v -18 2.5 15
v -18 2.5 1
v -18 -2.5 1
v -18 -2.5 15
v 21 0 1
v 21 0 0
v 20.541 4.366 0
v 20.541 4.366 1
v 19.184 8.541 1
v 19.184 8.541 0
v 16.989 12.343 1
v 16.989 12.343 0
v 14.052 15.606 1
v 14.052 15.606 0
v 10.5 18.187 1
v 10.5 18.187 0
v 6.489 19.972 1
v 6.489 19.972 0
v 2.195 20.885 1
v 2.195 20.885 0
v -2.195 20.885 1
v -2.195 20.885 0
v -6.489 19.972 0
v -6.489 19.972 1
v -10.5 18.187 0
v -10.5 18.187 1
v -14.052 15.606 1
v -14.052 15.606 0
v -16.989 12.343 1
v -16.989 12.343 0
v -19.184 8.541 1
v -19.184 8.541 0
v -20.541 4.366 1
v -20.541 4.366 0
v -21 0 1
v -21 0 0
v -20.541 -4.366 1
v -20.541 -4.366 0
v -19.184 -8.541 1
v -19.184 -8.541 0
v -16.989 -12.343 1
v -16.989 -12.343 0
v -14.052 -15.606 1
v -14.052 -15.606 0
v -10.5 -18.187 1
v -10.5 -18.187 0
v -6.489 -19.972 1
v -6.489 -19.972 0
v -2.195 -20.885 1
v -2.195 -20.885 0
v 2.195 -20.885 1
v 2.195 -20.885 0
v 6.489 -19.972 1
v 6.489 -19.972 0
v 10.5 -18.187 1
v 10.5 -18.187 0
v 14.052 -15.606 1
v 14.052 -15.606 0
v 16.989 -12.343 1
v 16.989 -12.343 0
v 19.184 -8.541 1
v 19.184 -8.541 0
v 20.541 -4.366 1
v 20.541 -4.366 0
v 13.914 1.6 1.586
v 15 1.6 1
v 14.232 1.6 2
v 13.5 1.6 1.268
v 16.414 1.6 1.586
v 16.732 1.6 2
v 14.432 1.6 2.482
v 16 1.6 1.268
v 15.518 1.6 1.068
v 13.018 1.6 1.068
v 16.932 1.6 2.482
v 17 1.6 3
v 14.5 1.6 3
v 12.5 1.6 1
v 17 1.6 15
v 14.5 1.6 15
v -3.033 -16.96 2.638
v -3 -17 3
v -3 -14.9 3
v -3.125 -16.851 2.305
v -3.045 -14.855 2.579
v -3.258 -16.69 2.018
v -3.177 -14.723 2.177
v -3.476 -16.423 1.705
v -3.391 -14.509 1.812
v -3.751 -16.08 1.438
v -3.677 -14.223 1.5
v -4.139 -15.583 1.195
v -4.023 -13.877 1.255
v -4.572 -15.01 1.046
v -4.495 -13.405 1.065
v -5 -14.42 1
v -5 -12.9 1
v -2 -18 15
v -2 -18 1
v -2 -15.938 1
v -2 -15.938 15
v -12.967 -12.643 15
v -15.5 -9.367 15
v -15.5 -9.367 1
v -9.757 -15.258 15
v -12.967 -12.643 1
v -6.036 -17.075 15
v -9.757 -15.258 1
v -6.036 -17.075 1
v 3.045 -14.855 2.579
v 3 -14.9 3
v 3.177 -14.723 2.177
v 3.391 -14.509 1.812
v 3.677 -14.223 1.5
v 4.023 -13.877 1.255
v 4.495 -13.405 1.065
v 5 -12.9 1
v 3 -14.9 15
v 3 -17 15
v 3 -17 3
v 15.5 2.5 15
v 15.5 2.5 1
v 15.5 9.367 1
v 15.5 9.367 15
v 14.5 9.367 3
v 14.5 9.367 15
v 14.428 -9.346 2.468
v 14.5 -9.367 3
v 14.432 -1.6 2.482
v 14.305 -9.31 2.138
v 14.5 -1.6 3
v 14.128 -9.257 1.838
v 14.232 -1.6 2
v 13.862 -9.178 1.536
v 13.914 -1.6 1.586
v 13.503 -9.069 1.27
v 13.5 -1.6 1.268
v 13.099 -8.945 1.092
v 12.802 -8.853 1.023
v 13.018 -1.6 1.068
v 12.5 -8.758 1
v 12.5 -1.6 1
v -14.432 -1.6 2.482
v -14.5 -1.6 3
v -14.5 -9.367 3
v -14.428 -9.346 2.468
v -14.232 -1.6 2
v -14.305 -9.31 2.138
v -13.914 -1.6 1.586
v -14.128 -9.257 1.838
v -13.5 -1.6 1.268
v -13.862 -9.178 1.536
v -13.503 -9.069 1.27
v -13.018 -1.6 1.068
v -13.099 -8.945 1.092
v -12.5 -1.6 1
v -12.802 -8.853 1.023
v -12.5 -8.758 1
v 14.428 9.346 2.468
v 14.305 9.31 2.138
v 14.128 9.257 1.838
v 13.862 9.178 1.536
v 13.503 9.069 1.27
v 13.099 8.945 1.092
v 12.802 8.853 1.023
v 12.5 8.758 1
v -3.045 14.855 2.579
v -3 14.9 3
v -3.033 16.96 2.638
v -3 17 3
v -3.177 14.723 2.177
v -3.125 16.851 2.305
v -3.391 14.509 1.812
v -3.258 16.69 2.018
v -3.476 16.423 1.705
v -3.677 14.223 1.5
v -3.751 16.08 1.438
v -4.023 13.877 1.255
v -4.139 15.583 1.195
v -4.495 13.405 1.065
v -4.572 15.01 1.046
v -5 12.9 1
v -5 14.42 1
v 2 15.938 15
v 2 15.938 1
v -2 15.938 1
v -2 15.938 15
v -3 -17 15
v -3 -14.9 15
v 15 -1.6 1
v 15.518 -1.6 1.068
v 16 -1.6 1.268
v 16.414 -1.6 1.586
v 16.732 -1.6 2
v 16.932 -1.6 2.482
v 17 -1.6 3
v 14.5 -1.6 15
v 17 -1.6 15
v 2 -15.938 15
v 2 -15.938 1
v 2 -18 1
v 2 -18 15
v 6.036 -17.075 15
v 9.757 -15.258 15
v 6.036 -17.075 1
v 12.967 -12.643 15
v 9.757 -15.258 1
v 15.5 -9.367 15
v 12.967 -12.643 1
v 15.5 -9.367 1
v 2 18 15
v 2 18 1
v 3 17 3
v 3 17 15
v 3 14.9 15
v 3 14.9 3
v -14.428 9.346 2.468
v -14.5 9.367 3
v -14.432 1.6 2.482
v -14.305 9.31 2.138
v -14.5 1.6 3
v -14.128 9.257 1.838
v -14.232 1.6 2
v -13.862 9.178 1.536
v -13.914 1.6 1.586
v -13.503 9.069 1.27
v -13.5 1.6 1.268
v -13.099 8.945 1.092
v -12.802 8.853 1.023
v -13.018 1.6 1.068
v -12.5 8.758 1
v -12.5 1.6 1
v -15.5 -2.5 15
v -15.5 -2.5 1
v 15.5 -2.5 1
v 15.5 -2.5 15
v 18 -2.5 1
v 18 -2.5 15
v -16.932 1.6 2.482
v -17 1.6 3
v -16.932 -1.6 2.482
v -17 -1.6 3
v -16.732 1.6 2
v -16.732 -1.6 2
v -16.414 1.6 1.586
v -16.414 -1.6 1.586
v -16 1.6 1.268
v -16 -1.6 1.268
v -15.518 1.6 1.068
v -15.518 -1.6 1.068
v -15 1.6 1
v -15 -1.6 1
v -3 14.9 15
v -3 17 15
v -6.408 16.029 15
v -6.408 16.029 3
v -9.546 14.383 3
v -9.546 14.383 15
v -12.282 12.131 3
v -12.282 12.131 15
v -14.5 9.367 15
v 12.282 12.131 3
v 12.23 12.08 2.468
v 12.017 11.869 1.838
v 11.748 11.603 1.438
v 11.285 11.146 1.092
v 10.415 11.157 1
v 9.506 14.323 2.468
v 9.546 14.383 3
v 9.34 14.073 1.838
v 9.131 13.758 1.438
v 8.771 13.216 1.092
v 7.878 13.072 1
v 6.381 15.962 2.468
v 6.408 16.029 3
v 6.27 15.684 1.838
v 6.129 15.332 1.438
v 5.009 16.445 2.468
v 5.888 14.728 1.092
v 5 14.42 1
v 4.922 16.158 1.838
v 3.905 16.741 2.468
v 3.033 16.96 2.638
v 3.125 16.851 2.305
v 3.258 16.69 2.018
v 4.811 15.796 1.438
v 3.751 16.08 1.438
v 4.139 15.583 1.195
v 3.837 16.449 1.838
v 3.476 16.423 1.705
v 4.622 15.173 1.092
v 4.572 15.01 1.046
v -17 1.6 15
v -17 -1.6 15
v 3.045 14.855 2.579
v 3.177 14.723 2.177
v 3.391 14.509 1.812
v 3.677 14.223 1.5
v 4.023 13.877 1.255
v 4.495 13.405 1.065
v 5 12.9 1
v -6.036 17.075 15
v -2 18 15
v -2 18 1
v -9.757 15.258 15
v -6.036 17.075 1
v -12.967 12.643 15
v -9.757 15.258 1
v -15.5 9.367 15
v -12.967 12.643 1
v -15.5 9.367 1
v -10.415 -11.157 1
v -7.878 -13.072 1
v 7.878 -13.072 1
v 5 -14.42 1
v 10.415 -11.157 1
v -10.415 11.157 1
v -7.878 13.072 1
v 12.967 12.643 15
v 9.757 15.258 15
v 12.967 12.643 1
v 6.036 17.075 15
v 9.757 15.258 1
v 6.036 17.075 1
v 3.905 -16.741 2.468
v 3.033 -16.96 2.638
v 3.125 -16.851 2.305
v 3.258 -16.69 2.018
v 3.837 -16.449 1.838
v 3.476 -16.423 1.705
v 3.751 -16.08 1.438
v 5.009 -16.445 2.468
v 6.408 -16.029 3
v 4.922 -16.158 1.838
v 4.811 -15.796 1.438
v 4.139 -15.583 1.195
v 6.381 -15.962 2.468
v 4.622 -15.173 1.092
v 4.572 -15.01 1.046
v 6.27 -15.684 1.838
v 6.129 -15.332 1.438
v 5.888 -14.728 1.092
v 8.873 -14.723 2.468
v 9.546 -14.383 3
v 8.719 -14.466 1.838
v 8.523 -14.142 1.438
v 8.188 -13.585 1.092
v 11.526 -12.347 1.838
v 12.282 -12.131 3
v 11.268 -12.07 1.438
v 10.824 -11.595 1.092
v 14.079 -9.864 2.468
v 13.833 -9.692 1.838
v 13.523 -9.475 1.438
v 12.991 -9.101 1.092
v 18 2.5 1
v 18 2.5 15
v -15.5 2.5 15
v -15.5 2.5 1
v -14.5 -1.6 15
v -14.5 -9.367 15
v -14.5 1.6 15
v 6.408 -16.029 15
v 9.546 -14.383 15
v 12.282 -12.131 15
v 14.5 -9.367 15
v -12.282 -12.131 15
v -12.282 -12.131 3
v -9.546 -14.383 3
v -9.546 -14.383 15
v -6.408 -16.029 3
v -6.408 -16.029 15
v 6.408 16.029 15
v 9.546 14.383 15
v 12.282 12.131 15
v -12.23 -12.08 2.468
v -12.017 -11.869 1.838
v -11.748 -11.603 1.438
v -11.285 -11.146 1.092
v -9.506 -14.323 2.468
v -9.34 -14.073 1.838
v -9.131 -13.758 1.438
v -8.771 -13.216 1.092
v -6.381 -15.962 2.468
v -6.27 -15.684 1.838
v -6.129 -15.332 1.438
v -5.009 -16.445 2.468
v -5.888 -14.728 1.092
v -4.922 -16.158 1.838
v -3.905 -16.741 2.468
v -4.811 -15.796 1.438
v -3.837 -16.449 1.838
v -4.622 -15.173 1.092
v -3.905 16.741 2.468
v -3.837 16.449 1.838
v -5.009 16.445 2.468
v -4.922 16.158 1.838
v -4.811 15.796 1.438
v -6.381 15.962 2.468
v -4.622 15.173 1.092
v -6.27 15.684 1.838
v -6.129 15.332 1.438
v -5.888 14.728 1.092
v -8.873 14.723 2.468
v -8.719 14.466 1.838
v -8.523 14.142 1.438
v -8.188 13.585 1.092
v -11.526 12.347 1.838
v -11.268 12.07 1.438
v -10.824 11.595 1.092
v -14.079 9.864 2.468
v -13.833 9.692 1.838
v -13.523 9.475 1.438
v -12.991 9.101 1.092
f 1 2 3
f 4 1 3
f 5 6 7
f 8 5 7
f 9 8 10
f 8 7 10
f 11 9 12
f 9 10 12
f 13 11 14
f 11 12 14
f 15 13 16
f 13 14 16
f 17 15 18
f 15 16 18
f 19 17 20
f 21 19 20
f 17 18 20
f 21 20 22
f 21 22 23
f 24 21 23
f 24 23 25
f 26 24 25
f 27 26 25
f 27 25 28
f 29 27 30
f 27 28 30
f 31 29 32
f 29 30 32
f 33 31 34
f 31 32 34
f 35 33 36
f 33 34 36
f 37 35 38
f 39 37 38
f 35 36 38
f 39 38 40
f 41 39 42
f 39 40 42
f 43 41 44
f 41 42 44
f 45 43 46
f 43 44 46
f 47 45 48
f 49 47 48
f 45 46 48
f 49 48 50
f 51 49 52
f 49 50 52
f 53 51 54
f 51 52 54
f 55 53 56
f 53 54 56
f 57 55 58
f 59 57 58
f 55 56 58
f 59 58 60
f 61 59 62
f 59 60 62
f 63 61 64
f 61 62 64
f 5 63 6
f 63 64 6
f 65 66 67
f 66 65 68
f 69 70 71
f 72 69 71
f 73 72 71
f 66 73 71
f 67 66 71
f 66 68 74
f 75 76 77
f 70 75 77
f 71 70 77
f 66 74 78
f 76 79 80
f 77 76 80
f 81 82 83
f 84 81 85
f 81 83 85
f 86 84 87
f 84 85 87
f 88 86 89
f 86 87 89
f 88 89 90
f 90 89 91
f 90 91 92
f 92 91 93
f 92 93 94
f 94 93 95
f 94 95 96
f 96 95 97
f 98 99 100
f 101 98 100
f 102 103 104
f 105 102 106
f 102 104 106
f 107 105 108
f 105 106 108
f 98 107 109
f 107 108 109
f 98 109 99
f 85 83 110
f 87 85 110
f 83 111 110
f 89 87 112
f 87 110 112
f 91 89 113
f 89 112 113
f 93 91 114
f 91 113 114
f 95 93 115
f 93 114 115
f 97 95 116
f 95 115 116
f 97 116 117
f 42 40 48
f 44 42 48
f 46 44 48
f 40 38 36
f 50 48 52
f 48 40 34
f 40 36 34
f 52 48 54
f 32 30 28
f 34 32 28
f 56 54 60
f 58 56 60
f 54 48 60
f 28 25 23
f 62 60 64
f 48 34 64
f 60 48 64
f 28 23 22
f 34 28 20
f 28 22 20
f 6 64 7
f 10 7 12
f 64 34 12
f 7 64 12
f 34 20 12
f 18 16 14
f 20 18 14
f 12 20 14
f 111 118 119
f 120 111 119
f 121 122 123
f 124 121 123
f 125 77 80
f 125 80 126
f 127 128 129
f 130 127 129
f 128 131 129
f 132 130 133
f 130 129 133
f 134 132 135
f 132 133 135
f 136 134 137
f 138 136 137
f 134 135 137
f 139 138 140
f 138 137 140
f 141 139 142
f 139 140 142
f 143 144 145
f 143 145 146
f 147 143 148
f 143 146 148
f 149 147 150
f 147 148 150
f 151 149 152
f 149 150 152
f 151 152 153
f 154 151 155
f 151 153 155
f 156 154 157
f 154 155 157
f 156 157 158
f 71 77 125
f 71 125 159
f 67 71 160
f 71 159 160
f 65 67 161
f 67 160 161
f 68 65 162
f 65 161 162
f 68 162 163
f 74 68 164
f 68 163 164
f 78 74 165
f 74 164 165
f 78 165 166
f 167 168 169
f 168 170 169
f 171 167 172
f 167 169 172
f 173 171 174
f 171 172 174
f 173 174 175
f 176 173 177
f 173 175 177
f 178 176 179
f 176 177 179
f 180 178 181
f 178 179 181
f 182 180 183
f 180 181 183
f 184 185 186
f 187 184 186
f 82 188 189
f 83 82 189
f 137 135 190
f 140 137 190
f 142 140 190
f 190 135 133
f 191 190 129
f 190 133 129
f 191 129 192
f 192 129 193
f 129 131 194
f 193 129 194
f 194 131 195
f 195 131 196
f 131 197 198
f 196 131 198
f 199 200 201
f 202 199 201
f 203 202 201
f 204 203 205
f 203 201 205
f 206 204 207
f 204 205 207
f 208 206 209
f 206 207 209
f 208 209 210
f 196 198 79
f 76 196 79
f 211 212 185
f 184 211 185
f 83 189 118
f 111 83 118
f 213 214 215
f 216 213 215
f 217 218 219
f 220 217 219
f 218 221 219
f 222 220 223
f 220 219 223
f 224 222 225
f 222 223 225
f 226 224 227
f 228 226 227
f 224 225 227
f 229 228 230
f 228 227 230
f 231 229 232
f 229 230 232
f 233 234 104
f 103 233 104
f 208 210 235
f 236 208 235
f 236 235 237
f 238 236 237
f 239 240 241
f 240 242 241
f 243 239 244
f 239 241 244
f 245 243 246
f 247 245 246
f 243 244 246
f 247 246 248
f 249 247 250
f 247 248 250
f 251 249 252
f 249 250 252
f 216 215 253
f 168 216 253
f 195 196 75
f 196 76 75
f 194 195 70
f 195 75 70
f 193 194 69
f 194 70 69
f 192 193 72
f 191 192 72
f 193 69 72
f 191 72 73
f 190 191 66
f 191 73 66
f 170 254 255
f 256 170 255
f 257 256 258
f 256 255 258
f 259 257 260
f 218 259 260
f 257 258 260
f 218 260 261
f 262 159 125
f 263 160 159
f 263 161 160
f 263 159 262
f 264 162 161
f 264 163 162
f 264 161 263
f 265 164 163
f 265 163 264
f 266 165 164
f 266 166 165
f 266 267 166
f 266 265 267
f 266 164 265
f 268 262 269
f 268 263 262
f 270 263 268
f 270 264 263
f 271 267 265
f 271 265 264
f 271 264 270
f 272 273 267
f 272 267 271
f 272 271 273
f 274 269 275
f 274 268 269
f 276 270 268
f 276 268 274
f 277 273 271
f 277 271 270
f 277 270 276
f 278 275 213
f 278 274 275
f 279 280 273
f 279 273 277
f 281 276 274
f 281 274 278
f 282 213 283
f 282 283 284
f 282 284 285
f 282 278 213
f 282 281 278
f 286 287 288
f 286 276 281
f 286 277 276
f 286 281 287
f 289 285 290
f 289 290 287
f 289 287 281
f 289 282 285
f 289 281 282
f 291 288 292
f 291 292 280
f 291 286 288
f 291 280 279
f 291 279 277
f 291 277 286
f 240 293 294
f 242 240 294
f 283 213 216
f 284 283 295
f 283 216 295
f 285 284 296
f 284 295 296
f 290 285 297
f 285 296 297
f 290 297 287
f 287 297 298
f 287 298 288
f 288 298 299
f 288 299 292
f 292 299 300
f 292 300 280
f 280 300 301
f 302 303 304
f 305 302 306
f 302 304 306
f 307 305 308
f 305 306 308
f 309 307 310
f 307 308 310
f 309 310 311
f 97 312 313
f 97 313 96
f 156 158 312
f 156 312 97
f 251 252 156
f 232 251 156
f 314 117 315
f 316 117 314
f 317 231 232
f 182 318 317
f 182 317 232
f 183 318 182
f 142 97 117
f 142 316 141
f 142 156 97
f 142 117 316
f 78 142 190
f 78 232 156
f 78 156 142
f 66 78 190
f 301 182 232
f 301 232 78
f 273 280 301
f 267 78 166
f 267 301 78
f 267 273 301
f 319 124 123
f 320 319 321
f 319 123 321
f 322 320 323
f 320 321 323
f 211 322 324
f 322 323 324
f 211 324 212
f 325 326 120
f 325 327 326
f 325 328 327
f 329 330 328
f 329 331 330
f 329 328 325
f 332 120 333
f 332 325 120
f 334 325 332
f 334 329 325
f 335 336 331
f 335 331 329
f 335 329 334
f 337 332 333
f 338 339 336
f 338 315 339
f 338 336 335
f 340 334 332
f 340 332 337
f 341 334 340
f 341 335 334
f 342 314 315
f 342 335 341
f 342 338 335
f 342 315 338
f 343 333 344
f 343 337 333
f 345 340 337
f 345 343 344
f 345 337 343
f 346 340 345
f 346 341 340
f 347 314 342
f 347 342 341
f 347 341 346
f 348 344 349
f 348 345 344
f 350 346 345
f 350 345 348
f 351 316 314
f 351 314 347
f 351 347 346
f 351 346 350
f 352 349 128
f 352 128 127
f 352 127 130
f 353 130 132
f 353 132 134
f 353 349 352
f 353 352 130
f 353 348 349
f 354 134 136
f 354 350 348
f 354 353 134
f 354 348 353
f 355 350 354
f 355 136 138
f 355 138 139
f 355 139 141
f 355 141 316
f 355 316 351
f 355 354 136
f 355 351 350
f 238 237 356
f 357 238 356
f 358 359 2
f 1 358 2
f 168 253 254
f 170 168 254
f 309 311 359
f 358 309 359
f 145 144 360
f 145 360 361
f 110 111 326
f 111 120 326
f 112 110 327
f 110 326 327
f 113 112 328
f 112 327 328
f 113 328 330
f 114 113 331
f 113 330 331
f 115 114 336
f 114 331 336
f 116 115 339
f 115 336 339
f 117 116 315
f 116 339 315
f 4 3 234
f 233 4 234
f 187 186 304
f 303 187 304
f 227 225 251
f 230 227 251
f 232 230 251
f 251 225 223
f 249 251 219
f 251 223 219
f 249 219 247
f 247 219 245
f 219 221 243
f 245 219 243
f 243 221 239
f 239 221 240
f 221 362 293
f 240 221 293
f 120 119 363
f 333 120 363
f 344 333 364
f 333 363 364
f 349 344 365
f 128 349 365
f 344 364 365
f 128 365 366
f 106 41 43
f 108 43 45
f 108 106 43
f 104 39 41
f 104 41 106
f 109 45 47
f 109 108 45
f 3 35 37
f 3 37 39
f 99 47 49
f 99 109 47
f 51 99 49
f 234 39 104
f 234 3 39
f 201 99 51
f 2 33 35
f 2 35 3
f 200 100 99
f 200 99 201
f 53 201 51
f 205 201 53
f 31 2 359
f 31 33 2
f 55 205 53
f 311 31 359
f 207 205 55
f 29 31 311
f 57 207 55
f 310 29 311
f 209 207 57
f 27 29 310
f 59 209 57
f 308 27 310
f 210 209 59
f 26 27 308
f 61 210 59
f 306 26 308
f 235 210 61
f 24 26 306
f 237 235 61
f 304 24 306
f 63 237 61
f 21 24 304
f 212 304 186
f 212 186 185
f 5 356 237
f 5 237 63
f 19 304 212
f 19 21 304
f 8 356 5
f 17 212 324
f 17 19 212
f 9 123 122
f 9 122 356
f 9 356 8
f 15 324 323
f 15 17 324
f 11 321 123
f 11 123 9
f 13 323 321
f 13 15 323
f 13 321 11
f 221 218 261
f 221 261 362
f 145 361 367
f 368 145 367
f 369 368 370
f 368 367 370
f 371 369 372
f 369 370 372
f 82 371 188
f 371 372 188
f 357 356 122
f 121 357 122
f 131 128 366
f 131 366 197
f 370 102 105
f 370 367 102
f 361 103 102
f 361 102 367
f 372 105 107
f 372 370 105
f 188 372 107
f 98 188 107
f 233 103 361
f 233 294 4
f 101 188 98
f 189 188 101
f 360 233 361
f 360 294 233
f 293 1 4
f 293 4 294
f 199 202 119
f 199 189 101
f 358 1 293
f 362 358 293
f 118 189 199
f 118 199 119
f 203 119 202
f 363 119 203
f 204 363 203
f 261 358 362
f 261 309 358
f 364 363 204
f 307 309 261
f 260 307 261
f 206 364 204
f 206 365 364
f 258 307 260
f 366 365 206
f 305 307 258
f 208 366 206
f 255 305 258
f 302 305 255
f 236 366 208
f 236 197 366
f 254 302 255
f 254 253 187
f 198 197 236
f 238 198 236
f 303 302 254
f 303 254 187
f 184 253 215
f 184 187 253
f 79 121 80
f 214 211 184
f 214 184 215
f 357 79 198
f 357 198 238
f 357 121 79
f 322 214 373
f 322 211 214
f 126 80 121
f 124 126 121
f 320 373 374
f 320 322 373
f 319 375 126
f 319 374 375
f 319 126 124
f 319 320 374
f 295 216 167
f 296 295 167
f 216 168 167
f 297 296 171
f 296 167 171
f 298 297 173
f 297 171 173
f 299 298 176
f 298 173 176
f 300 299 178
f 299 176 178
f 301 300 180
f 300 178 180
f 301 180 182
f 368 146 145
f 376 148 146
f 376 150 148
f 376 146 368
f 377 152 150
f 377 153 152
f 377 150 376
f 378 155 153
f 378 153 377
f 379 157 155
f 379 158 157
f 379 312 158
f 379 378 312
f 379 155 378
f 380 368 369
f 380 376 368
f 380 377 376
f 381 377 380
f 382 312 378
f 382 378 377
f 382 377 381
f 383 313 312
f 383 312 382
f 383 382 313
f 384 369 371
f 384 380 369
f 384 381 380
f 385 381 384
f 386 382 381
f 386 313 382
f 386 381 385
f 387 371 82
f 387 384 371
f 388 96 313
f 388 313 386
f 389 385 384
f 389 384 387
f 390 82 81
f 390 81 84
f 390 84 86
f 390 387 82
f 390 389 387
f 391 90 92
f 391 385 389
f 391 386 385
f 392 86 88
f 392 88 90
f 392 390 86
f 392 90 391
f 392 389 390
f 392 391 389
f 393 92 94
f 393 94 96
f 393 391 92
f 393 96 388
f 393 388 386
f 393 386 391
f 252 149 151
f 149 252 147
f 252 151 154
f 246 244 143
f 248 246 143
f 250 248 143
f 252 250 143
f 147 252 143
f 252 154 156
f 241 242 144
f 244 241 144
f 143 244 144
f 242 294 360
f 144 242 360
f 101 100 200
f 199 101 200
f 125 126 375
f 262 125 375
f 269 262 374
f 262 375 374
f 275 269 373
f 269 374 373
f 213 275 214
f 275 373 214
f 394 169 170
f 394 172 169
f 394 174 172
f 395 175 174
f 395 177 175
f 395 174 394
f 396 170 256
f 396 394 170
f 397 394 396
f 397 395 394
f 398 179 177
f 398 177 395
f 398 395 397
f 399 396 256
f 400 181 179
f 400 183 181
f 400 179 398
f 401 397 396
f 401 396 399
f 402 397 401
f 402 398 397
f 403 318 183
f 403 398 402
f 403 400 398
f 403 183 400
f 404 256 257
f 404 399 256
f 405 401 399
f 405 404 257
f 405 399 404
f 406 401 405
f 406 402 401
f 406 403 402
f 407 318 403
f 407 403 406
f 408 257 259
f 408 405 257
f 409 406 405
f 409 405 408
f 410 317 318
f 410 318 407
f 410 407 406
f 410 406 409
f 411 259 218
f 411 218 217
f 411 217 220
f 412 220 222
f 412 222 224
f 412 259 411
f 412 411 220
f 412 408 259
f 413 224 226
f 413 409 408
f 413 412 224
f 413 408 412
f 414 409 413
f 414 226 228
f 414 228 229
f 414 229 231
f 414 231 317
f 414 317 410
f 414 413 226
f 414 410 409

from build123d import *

# Parameters (mm, degrees)
F0_R     = 21
F1_DEPTH = 1
F2_DEPTH = 15
F4_DEPTH = 14
F5_R     = 2


with BuildPart() as f1:
    # F0 (on Top) → F1 (new body)
    with BuildSketch(Plane.XY):
        Circle(F0_R)
        with BuildLine():
            Line((-15.5, -2.5), (-18, -2.5))
            Line((-18, -2.5), (-18, 0))
            Line((-18, 0), (-18, 2.5))
            Line((-18, 2.5), (-15.5, 2.5))
            Line((-15.5, 2.5), (-15.5, 9.367497))
            ThreePointArc((-15.5, 9.367497), (-9.756666, 15.25803), (-2, 18))
            Line((-2, 18), (-2, 15.938399))
            Line((-2, 15.938399), (0, 15.938399))
            Line((0, 15.938399), (2, 15.938399))
            Line((2, 15.938399), (2, 18))
            ThreePointArc((2, 18), (9.756666, 15.25803), (15.5, 9.367497))
            Line((15.5, 9.367497), (15.5, 2.5))
            Line((15.5, 2.5), (18, 2.5))
            Line((18, 2.5), (18, 0))
            Line((18, 0), (18, -2.5))
            Line((18, -2.5), (15.5, -2.5))
            Line((15.5, -2.5), (15.5, -9.367497))
            ThreePointArc((15.5, -9.367497), (9.756666, -15.25803), (2, -18))
            Line((2, -18), (2, -15.938399))
            Line((2, -15.938399), (0, -15.938399))
            Line((0, -15.938399), (-2, -15.938399))
            Line((-2, -15.938399), (-2, -18))
            ThreePointArc((-2, -18), (-9.756666, -15.25803), (-15.5, -9.367497))
            Line((-15.5, -9.367497), (-15.5, -2.5))
        make_face(mode=Mode.SUBTRACT)
        with BuildLine():
            Line((-18, 0), (-18, -2.5))
            Line((-18, -2.5), (-15.5, -2.5))
            Line((-15.5, -2.5), (-15.5, -9.367497))
            ThreePointArc((-15.5, -9.367497), (-9.756666, -15.25803), (-2, -18))
            Line((-2, -18), (-2, -15.938399))
            Line((-2, -15.938399), (0, -15.938399))
            Line((0, -15.938399), (2, -15.938399))
            Line((2, -15.938399), (2, -18))
            ThreePointArc((2, -18), (9.756666, -15.25803), (15.5, -9.367497))
            Line((15.5, -9.367497), (15.5, -2.5))
            Line((15.5, -2.5), (18, -2.5))
            Line((18, -2.5), (18, 0))
            Line((18, 0), (18, 2.5))
            Line((18, 2.5), (15.5, 2.5))
            Line((15.5, 2.5), (15.5, 9.367497))
            ThreePointArc((15.5, 9.367497), (9.756666, 15.25803), (2, 18))
            Line((2, 18), (2, 15.938399))
            Line((2, 15.938399), (0, 15.938399))
            Line((0, 15.938399), (-2, 15.938399))
            Line((-2, 15.938399), (-2, 18))
            ThreePointArc((-2, 18), (-9.756666, 15.25803), (-15.5, 9.367497))
            Line((-15.5, 9.367497), (-15.5, 2.5))
            Line((-15.5, 2.5), (-18, 2.5))
            Line((-18, 2.5), (-18, 0))
        make_face()
    extrude(amount=F1_DEPTH)

    # F0 (on Top) → F2 (join)
    with BuildSketch(Plane.XY):
        with BuildLine():
            Line((-18, 0), (-18, -2.5))
            Line((-18, -2.5), (-15.5, -2.5))
            Line((-15.5, -2.5), (-15.5, -9.367497))
            ThreePointArc((-15.5, -9.367497), (-9.756666, -15.25803), (-2, -18))
            Line((-2, -18), (-2, -15.938399))
            Line((-2, -15.938399), (0, -15.938399))
            Line((0, -15.938399), (2, -15.938399))
            Line((2, -15.938399), (2, -18))
            ThreePointArc((2, -18), (9.756666, -15.25803), (15.5, -9.367497))
            Line((15.5, -9.367497), (15.5, -2.5))
            Line((15.5, -2.5), (18, -2.5))
            Line((18, -2.5), (18, 0))
            Line((18, 0), (18, 2.5))
            Line((18, 2.5), (15.5, 2.5))
            Line((15.5, 2.5), (15.5, 9.367497))
            ThreePointArc((15.5, 9.367497), (9.756666, 15.25803), (2, 18))
            Line((2, 18), (2, 15.938399))
            Line((2, 15.938399), (0, 15.938399))
            Line((0, 15.938399), (-2, 15.938399))
            Line((-2, 15.938399), (-2, 18))
            ThreePointArc((-2, 18), (-9.756666, 15.25803), (-15.5, 9.367497))
            Line((-15.5, 9.367497), (-15.5, 2.5))
            Line((-15.5, 2.5), (-18, 2.5))
            Line((-18, 2.5), (-18, 0))
        make_face()
    extrude(amount=F2_DEPTH)

    # F3 (on face) → F4 (cut)
    with BuildSketch(Plane.XY.offset(15)):
        with BuildLine():
            Line((-17, 0), (-17, -1.6))
            Line((-17, -1.6), (-14.5, -1.6))
            Line((-14.5, -1.6), (-14.5, -9.367497))
            ThreePointArc((-14.5, -9.367497), (-9.546008, -14.383106), (-3, -17))
            Line((-3, -17), (-3, -14.9))
            Line((-3, -14.9), (0, -14.9))
            Line((0, -14.9), (3, -14.9))
            Line((3, -14.9), (3, -17))
            ThreePointArc((3, -17), (9.546008, -14.383106), (14.5, -9.367497))
            Line((14.5, -9.367497), (14.5, -1.6))
            Line((14.5, -1.6), (17, -1.6))
            Line((17, -1.6), (17, 0))
            Line((17, 0), (17, 1.6))
            Line((17, 1.6), (14.5, 1.6))
            Line((14.5, 1.6), (14.5, 9.367497))
            ThreePointArc((14.5, 9.367497), (9.546008, 14.383106), (3, 17))
            Line((3, 17), (3, 14.9))
            Line((3, 14.9), (0, 14.9))
            Line((0, 14.9), (-3, 14.9))
            Line((-3, 14.9), (-3, 17))
            ThreePointArc((-3, 17), (-9.546008, 14.383106), (-14.5, 9.367497))
            Line((-14.5, 9.367497), (-14.5, 1.6))
            Line((-14.5, 1.6), (-17, 1.6))
            Line((-17, 1.6), (-17, 0))
        make_face()
    extrude(amount=-F4_DEPTH, mode=Mode.SUBTRACT)

    # F5
    f5_edges = [f1.edges().sort_by_distance(p)[0] for p in [
        (-14.5, -5.483748, 1),
        (-17, 0, 1),
        (-14.5, 5.483748, 1),
        (-9.546008, 14.383106, 1),
        (-9.546008, -14.383106, 1),
        (9.546008, -14.383106, 1),
        (0, -14.9, 1),
        (14.5, -5.483748, 1),
        (14.5, 5.483748, 1),
        (17, 0, 1),
        (9.546008, 14.383106, 1),
        (0, 14.9, 1),
        (3, -15.95, 1),
        (-3, -15.95, 1),
        (3, 15.95, 1),
        (-3, 15.95, 1),
    ]]
    fillet(f5_edges, radius=F5_R)


solid = f1.part
